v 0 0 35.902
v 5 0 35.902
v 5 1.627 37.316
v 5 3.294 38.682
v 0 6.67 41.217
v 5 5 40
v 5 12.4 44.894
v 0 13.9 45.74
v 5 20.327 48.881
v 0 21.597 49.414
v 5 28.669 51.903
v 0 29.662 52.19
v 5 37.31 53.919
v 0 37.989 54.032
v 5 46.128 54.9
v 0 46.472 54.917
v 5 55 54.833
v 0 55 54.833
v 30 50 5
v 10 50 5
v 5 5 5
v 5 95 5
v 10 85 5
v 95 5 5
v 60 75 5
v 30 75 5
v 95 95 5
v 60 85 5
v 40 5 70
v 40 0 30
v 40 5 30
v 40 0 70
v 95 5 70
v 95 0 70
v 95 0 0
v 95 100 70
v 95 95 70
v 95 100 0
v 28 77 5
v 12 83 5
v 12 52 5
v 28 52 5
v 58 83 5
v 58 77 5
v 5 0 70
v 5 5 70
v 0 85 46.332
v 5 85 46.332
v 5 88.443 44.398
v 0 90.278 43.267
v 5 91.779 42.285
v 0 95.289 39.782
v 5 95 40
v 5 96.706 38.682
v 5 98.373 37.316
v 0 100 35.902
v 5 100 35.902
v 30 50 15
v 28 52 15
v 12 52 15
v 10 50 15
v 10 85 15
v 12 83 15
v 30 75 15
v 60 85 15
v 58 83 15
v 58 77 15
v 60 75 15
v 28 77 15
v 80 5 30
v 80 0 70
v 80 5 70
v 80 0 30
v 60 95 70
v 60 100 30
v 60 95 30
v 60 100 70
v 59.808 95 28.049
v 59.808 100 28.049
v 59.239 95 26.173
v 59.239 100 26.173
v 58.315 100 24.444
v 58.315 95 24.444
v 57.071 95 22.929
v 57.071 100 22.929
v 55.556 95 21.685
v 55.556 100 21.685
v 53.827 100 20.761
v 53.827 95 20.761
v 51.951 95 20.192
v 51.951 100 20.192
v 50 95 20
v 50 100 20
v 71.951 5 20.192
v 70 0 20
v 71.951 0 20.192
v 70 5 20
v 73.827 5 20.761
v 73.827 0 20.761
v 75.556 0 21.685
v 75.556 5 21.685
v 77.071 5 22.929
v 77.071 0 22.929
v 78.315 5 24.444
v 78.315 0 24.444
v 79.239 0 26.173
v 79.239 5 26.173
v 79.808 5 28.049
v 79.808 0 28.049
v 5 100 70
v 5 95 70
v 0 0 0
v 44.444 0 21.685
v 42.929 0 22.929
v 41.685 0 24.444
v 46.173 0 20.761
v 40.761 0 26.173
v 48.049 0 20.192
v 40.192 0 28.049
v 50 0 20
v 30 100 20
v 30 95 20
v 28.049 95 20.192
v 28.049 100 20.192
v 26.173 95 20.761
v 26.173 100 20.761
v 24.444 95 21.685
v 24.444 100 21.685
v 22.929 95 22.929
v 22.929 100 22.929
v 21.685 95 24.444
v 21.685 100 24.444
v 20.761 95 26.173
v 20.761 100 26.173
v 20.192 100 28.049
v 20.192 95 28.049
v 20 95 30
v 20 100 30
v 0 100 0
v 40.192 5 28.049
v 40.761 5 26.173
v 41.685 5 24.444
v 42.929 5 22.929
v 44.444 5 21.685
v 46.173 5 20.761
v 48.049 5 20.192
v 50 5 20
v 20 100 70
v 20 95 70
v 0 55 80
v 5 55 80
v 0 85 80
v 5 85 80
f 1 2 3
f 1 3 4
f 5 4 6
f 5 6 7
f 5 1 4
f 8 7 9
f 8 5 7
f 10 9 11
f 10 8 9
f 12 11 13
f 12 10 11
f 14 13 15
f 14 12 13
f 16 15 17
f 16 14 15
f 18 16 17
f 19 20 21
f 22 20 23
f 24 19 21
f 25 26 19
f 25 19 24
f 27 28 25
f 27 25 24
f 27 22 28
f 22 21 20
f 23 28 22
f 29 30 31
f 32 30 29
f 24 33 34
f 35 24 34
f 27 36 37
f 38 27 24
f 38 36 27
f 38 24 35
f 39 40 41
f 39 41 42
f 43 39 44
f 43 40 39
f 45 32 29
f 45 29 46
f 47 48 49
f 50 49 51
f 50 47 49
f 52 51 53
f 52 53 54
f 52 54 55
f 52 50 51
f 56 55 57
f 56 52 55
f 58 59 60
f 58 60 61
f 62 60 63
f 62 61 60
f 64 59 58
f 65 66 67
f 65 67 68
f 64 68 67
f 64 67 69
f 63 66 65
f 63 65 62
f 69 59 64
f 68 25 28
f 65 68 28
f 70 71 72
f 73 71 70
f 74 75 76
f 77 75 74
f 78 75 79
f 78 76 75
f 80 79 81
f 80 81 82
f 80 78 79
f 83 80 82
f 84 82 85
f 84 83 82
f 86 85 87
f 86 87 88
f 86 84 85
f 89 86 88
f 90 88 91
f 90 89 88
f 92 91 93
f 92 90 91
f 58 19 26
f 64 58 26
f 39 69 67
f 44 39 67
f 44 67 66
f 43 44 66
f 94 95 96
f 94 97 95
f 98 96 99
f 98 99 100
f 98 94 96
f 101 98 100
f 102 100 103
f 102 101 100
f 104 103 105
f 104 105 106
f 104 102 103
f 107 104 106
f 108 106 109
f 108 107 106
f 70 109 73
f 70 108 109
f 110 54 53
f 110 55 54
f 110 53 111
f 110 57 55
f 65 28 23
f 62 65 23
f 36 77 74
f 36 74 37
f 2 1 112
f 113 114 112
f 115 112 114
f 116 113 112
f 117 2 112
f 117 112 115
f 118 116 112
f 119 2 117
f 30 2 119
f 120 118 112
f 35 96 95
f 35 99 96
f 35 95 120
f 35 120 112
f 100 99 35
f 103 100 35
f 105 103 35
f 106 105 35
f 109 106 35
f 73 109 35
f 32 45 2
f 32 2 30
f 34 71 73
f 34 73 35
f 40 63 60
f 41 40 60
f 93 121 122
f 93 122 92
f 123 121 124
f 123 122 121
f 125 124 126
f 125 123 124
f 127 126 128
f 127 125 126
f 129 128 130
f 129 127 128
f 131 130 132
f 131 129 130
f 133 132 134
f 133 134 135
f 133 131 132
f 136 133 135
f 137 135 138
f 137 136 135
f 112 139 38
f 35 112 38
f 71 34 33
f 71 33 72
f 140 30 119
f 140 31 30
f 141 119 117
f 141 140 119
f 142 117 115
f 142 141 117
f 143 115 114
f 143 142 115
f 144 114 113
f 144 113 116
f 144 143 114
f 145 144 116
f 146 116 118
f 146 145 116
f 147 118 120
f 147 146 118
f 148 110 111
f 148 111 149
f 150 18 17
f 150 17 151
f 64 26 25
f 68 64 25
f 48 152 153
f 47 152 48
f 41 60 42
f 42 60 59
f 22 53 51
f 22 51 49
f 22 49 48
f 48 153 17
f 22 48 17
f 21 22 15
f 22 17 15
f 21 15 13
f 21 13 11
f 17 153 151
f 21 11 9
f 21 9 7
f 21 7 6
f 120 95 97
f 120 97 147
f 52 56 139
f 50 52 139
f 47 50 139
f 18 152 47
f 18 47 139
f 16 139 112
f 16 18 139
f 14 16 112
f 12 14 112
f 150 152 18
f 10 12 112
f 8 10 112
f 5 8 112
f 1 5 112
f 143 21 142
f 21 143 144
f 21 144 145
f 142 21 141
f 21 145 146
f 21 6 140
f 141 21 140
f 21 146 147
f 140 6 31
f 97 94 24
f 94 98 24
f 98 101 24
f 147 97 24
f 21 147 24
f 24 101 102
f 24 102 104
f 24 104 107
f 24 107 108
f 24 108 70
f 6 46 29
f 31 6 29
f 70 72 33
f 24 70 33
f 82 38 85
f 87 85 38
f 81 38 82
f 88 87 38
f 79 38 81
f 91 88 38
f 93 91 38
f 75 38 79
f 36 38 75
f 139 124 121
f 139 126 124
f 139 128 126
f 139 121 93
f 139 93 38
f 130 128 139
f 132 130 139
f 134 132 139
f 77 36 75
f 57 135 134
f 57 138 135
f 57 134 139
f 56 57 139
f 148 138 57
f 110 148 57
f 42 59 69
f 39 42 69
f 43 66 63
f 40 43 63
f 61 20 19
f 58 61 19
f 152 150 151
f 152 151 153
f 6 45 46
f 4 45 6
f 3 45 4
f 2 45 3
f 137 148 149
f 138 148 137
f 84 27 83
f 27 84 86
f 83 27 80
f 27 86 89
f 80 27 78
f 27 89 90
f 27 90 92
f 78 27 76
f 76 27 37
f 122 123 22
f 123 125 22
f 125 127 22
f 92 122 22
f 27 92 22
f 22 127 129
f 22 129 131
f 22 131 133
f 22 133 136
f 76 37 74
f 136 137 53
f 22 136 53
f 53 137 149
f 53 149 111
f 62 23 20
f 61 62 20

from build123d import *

# Parameters (mm, degrees)
F0_W      = 95
F0_H      = 100
F1_DEPTH  = 5
F3_DEPTH  = 5
F5_DEPTH  = 5
F7_DEPTH  = 5
F8_R      = 10
F10_DEPTH = 10
F12_DEPTH = 10


with BuildPart() as f1:
    # F0 (on Top) → F1 (new body)
    with BuildSketch(Plane.XY):
        with Locations((47.5, 50)):
            Rectangle(F0_W, F0_H)
    extrude(amount=F1_DEPTH)

    # F2 (on face) → F3 (join)
    with BuildSketch(Plane(origin=(0, 0, 0), x_dir=(0, -1, 0), z_dir=(-1, 0, 0))):
        with BuildLine():
            Line((0, 5), (0, 35.901699))
            ThreePointArc((0, 35.901699), (-25.589962, 50.916501), (-55, 54.833148))
            Line((-55, 54.833148), (-55, 80))
            Line((-55, 80), (-85, 80))
            Line((-85, 80), (-85, 46.332496))
            ThreePointArc((-85, 46.332496), (-92.818809, 41.57556), (-100, 35.901699))
            Line((-100, 35.901699), (-100, 5))
            Line((-100, 5), (0, 5))
        make_face()
    extrude(amount=-F3_DEPTH)

    # F4 (on face) → F5 (join)
    with BuildSketch(Plane.XZ):
        Polygon((5, 70), (5, 5), (95, 5), (95, 70), (80, 70), (80, 20), (40, 20), (40, 70), align=None)
    extrude(amount=-F5_DEPTH)

    # F6 (on face) → F7 (join)
    with BuildSketch(Plane(origin=(0, 100, 0), x_dir=(-1, 0, 0), z_dir=(0, 1, 0))):
        Polygon((-95, 5), (-5, 5), (-5, 70), (-20, 70), (-20, 20), (-60, 20), (-60, 70), (-95, 70), align=None)
    extrude(amount=-F7_DEPTH)

    # F8
    f8_edges = [f1.edges().sort_by_distance(p)[0] for p in [
        (20, 97.5, 20),
        (40, 2.5, 20),
        (60, 97.5, 20),
        (80, 2.5, 20),
    ]]
    fillet(f8_edges, radius=F8_R)

    # F9 (on face) → F10 (join)
    with BuildSketch(Plane.XY.offset(5)):
        Polygon((10, 85), (10, 50), (30, 50), (30, 75), (60, 75), (60, 85), align=None)
    extrude(amount=F10_DEPTH)

    # F11 (on face) → F12 (cut)
    with BuildSketch(Plane.XY.offset(15)):
        Polygon((57.999999, 82.999999), (12.000001, 82.999999), (12.000001, 52.000001), (27.999999, 52.000001), (27.999999, 77.000001), (57.999999, 77.000001), align=None)
    extrude(amount=-F12_DEPTH, mode=Mode.SUBTRACT)


solid = f1.part
